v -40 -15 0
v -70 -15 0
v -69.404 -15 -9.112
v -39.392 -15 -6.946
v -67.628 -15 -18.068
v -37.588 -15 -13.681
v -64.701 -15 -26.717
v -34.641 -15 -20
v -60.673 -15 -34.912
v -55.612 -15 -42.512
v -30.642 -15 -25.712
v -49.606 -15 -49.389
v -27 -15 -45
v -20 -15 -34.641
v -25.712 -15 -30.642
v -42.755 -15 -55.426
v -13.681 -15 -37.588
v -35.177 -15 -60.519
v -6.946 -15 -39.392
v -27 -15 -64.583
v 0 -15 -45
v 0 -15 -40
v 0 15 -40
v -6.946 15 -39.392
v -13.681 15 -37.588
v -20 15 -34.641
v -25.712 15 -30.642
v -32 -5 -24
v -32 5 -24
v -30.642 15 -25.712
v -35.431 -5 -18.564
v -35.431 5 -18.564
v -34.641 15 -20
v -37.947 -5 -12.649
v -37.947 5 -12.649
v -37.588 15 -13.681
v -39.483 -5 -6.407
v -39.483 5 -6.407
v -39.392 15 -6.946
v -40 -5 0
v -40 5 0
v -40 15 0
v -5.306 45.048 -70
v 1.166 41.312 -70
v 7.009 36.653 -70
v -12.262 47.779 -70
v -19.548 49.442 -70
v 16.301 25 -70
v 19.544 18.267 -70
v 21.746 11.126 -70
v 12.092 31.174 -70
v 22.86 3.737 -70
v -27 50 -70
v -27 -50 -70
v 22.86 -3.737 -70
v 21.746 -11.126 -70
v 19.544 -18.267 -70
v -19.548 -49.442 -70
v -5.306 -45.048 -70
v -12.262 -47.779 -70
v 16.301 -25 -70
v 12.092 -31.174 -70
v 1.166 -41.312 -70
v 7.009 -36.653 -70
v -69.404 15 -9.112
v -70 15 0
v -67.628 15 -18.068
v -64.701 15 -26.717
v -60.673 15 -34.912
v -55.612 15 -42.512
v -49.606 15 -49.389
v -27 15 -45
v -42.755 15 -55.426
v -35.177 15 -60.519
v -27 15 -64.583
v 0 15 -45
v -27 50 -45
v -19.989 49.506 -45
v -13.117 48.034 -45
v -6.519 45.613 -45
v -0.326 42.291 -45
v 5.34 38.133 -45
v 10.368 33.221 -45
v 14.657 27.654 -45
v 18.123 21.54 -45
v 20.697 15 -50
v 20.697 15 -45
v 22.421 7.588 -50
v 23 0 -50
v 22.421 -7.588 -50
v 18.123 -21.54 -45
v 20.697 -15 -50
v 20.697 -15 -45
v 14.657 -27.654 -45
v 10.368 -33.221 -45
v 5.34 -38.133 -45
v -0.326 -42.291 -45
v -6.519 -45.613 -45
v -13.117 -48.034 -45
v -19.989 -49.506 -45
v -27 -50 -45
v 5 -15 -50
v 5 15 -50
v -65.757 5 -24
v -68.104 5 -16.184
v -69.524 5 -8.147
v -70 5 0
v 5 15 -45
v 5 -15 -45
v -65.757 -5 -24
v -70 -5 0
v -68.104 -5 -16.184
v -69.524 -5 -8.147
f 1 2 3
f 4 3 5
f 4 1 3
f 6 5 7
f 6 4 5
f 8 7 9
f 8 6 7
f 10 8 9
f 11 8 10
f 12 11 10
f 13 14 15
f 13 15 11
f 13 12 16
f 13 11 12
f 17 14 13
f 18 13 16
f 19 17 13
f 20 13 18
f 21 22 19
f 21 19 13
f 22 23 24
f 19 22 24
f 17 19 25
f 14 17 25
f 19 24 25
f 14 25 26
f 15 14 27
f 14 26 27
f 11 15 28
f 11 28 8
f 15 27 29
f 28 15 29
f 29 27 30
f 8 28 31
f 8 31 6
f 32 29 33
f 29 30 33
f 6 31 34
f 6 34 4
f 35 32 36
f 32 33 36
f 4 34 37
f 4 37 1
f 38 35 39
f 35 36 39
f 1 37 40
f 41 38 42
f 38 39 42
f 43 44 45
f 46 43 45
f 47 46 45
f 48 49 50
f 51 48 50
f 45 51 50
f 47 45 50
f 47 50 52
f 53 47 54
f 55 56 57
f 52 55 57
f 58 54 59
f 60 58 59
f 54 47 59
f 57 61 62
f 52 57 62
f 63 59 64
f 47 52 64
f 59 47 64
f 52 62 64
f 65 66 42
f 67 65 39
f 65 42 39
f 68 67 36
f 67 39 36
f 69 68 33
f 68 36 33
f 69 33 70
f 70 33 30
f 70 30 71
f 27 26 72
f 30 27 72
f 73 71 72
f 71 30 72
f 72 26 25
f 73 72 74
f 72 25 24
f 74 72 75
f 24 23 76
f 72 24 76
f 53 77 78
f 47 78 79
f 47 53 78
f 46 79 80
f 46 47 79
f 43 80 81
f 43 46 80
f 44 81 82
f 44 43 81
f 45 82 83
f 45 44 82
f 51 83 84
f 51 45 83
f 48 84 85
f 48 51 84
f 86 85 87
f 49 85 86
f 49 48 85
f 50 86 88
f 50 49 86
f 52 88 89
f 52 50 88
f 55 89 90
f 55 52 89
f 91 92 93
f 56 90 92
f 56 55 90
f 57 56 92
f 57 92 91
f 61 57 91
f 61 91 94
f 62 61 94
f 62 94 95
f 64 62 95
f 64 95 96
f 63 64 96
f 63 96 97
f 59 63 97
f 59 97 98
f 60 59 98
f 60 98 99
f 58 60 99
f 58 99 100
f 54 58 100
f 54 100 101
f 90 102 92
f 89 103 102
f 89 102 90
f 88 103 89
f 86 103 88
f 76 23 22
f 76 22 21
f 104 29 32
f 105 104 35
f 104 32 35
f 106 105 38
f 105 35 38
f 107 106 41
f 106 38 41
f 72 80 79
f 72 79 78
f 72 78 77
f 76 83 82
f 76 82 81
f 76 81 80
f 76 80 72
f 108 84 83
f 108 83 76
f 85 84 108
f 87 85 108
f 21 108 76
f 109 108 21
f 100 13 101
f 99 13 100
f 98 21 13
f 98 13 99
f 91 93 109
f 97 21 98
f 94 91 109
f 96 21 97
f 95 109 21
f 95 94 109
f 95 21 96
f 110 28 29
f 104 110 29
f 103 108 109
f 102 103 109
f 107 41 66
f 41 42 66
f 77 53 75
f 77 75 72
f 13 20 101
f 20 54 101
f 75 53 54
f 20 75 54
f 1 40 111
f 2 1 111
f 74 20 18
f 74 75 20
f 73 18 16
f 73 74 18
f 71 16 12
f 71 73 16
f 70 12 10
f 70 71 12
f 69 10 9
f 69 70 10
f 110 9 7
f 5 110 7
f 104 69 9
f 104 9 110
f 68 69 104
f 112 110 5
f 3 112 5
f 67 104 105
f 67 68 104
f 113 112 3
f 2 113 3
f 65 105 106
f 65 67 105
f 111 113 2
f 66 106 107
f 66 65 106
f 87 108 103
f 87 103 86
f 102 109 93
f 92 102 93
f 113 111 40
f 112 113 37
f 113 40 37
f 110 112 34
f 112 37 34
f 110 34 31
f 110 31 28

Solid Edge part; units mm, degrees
sketch "Sketch1" plane through (0, 0, 0) normal (0, -1, 0) x (1, 0, 0)
  line L0 (-40, 0) -> (-70, 0)
  line L1 (0, -40) -> (0, -70)
  arc A0 (0, -40) -> (-40, 0) centre (0, 0) cw
  arc A1 (0, -70) -> (-70, 0) centre (0, 0) cw
extrude "Protrusion1" add sketch "Sketch1" along normal mid plane 30
sketch "Sketch2" plane through (0, 0, 0) normal (0, -1, 0) x (1, 0, 0)
  line L0 (23, -45) -> (23, -70)
  line L1 (23, -70) -> (-27, -70)
  line L2 (-27, -70) -> (-27, -45)
  line L3 (-27, -45) -> (23, -45)
revolve "RevolvedProtrusion_3" add sketch "Sketch2" angle 180 mid plane about axis through (-27, 0, -70) along (0, 0, 1)
sketch "Sketch3" plane through (0, 0, 0) normal (-1, 0, 0) x (0, -1, 0)
  line L0 (5, 0) -> (5, -24)
  line L1 (5, -24) -> (-5, -24)
  line L2 (-5, -24) -> (-5, 0)
  line L3 (-5, 0) -> (5, 0)
extrude "ExtrudedCutout_5" cut sketch "Sketch3" along normal blind 94.102
sketch "Sketch4" plane through (-2, 0, -45) normal (0, 0, 1) x (0, 1, 0)
  line L0 (-15, -7) -> (-15, -22.697)
  line L1 (0, -7) -> (-15, -7)
  line L2 (0, -7) -> (15, -7)
  line L3 (15, -7) -> (15, -22.697)
extrude "ExtrudedCutout_6" cut sketch "Sketch4" against normal blind 5 material side at (12.8485, -14.95, -45)
